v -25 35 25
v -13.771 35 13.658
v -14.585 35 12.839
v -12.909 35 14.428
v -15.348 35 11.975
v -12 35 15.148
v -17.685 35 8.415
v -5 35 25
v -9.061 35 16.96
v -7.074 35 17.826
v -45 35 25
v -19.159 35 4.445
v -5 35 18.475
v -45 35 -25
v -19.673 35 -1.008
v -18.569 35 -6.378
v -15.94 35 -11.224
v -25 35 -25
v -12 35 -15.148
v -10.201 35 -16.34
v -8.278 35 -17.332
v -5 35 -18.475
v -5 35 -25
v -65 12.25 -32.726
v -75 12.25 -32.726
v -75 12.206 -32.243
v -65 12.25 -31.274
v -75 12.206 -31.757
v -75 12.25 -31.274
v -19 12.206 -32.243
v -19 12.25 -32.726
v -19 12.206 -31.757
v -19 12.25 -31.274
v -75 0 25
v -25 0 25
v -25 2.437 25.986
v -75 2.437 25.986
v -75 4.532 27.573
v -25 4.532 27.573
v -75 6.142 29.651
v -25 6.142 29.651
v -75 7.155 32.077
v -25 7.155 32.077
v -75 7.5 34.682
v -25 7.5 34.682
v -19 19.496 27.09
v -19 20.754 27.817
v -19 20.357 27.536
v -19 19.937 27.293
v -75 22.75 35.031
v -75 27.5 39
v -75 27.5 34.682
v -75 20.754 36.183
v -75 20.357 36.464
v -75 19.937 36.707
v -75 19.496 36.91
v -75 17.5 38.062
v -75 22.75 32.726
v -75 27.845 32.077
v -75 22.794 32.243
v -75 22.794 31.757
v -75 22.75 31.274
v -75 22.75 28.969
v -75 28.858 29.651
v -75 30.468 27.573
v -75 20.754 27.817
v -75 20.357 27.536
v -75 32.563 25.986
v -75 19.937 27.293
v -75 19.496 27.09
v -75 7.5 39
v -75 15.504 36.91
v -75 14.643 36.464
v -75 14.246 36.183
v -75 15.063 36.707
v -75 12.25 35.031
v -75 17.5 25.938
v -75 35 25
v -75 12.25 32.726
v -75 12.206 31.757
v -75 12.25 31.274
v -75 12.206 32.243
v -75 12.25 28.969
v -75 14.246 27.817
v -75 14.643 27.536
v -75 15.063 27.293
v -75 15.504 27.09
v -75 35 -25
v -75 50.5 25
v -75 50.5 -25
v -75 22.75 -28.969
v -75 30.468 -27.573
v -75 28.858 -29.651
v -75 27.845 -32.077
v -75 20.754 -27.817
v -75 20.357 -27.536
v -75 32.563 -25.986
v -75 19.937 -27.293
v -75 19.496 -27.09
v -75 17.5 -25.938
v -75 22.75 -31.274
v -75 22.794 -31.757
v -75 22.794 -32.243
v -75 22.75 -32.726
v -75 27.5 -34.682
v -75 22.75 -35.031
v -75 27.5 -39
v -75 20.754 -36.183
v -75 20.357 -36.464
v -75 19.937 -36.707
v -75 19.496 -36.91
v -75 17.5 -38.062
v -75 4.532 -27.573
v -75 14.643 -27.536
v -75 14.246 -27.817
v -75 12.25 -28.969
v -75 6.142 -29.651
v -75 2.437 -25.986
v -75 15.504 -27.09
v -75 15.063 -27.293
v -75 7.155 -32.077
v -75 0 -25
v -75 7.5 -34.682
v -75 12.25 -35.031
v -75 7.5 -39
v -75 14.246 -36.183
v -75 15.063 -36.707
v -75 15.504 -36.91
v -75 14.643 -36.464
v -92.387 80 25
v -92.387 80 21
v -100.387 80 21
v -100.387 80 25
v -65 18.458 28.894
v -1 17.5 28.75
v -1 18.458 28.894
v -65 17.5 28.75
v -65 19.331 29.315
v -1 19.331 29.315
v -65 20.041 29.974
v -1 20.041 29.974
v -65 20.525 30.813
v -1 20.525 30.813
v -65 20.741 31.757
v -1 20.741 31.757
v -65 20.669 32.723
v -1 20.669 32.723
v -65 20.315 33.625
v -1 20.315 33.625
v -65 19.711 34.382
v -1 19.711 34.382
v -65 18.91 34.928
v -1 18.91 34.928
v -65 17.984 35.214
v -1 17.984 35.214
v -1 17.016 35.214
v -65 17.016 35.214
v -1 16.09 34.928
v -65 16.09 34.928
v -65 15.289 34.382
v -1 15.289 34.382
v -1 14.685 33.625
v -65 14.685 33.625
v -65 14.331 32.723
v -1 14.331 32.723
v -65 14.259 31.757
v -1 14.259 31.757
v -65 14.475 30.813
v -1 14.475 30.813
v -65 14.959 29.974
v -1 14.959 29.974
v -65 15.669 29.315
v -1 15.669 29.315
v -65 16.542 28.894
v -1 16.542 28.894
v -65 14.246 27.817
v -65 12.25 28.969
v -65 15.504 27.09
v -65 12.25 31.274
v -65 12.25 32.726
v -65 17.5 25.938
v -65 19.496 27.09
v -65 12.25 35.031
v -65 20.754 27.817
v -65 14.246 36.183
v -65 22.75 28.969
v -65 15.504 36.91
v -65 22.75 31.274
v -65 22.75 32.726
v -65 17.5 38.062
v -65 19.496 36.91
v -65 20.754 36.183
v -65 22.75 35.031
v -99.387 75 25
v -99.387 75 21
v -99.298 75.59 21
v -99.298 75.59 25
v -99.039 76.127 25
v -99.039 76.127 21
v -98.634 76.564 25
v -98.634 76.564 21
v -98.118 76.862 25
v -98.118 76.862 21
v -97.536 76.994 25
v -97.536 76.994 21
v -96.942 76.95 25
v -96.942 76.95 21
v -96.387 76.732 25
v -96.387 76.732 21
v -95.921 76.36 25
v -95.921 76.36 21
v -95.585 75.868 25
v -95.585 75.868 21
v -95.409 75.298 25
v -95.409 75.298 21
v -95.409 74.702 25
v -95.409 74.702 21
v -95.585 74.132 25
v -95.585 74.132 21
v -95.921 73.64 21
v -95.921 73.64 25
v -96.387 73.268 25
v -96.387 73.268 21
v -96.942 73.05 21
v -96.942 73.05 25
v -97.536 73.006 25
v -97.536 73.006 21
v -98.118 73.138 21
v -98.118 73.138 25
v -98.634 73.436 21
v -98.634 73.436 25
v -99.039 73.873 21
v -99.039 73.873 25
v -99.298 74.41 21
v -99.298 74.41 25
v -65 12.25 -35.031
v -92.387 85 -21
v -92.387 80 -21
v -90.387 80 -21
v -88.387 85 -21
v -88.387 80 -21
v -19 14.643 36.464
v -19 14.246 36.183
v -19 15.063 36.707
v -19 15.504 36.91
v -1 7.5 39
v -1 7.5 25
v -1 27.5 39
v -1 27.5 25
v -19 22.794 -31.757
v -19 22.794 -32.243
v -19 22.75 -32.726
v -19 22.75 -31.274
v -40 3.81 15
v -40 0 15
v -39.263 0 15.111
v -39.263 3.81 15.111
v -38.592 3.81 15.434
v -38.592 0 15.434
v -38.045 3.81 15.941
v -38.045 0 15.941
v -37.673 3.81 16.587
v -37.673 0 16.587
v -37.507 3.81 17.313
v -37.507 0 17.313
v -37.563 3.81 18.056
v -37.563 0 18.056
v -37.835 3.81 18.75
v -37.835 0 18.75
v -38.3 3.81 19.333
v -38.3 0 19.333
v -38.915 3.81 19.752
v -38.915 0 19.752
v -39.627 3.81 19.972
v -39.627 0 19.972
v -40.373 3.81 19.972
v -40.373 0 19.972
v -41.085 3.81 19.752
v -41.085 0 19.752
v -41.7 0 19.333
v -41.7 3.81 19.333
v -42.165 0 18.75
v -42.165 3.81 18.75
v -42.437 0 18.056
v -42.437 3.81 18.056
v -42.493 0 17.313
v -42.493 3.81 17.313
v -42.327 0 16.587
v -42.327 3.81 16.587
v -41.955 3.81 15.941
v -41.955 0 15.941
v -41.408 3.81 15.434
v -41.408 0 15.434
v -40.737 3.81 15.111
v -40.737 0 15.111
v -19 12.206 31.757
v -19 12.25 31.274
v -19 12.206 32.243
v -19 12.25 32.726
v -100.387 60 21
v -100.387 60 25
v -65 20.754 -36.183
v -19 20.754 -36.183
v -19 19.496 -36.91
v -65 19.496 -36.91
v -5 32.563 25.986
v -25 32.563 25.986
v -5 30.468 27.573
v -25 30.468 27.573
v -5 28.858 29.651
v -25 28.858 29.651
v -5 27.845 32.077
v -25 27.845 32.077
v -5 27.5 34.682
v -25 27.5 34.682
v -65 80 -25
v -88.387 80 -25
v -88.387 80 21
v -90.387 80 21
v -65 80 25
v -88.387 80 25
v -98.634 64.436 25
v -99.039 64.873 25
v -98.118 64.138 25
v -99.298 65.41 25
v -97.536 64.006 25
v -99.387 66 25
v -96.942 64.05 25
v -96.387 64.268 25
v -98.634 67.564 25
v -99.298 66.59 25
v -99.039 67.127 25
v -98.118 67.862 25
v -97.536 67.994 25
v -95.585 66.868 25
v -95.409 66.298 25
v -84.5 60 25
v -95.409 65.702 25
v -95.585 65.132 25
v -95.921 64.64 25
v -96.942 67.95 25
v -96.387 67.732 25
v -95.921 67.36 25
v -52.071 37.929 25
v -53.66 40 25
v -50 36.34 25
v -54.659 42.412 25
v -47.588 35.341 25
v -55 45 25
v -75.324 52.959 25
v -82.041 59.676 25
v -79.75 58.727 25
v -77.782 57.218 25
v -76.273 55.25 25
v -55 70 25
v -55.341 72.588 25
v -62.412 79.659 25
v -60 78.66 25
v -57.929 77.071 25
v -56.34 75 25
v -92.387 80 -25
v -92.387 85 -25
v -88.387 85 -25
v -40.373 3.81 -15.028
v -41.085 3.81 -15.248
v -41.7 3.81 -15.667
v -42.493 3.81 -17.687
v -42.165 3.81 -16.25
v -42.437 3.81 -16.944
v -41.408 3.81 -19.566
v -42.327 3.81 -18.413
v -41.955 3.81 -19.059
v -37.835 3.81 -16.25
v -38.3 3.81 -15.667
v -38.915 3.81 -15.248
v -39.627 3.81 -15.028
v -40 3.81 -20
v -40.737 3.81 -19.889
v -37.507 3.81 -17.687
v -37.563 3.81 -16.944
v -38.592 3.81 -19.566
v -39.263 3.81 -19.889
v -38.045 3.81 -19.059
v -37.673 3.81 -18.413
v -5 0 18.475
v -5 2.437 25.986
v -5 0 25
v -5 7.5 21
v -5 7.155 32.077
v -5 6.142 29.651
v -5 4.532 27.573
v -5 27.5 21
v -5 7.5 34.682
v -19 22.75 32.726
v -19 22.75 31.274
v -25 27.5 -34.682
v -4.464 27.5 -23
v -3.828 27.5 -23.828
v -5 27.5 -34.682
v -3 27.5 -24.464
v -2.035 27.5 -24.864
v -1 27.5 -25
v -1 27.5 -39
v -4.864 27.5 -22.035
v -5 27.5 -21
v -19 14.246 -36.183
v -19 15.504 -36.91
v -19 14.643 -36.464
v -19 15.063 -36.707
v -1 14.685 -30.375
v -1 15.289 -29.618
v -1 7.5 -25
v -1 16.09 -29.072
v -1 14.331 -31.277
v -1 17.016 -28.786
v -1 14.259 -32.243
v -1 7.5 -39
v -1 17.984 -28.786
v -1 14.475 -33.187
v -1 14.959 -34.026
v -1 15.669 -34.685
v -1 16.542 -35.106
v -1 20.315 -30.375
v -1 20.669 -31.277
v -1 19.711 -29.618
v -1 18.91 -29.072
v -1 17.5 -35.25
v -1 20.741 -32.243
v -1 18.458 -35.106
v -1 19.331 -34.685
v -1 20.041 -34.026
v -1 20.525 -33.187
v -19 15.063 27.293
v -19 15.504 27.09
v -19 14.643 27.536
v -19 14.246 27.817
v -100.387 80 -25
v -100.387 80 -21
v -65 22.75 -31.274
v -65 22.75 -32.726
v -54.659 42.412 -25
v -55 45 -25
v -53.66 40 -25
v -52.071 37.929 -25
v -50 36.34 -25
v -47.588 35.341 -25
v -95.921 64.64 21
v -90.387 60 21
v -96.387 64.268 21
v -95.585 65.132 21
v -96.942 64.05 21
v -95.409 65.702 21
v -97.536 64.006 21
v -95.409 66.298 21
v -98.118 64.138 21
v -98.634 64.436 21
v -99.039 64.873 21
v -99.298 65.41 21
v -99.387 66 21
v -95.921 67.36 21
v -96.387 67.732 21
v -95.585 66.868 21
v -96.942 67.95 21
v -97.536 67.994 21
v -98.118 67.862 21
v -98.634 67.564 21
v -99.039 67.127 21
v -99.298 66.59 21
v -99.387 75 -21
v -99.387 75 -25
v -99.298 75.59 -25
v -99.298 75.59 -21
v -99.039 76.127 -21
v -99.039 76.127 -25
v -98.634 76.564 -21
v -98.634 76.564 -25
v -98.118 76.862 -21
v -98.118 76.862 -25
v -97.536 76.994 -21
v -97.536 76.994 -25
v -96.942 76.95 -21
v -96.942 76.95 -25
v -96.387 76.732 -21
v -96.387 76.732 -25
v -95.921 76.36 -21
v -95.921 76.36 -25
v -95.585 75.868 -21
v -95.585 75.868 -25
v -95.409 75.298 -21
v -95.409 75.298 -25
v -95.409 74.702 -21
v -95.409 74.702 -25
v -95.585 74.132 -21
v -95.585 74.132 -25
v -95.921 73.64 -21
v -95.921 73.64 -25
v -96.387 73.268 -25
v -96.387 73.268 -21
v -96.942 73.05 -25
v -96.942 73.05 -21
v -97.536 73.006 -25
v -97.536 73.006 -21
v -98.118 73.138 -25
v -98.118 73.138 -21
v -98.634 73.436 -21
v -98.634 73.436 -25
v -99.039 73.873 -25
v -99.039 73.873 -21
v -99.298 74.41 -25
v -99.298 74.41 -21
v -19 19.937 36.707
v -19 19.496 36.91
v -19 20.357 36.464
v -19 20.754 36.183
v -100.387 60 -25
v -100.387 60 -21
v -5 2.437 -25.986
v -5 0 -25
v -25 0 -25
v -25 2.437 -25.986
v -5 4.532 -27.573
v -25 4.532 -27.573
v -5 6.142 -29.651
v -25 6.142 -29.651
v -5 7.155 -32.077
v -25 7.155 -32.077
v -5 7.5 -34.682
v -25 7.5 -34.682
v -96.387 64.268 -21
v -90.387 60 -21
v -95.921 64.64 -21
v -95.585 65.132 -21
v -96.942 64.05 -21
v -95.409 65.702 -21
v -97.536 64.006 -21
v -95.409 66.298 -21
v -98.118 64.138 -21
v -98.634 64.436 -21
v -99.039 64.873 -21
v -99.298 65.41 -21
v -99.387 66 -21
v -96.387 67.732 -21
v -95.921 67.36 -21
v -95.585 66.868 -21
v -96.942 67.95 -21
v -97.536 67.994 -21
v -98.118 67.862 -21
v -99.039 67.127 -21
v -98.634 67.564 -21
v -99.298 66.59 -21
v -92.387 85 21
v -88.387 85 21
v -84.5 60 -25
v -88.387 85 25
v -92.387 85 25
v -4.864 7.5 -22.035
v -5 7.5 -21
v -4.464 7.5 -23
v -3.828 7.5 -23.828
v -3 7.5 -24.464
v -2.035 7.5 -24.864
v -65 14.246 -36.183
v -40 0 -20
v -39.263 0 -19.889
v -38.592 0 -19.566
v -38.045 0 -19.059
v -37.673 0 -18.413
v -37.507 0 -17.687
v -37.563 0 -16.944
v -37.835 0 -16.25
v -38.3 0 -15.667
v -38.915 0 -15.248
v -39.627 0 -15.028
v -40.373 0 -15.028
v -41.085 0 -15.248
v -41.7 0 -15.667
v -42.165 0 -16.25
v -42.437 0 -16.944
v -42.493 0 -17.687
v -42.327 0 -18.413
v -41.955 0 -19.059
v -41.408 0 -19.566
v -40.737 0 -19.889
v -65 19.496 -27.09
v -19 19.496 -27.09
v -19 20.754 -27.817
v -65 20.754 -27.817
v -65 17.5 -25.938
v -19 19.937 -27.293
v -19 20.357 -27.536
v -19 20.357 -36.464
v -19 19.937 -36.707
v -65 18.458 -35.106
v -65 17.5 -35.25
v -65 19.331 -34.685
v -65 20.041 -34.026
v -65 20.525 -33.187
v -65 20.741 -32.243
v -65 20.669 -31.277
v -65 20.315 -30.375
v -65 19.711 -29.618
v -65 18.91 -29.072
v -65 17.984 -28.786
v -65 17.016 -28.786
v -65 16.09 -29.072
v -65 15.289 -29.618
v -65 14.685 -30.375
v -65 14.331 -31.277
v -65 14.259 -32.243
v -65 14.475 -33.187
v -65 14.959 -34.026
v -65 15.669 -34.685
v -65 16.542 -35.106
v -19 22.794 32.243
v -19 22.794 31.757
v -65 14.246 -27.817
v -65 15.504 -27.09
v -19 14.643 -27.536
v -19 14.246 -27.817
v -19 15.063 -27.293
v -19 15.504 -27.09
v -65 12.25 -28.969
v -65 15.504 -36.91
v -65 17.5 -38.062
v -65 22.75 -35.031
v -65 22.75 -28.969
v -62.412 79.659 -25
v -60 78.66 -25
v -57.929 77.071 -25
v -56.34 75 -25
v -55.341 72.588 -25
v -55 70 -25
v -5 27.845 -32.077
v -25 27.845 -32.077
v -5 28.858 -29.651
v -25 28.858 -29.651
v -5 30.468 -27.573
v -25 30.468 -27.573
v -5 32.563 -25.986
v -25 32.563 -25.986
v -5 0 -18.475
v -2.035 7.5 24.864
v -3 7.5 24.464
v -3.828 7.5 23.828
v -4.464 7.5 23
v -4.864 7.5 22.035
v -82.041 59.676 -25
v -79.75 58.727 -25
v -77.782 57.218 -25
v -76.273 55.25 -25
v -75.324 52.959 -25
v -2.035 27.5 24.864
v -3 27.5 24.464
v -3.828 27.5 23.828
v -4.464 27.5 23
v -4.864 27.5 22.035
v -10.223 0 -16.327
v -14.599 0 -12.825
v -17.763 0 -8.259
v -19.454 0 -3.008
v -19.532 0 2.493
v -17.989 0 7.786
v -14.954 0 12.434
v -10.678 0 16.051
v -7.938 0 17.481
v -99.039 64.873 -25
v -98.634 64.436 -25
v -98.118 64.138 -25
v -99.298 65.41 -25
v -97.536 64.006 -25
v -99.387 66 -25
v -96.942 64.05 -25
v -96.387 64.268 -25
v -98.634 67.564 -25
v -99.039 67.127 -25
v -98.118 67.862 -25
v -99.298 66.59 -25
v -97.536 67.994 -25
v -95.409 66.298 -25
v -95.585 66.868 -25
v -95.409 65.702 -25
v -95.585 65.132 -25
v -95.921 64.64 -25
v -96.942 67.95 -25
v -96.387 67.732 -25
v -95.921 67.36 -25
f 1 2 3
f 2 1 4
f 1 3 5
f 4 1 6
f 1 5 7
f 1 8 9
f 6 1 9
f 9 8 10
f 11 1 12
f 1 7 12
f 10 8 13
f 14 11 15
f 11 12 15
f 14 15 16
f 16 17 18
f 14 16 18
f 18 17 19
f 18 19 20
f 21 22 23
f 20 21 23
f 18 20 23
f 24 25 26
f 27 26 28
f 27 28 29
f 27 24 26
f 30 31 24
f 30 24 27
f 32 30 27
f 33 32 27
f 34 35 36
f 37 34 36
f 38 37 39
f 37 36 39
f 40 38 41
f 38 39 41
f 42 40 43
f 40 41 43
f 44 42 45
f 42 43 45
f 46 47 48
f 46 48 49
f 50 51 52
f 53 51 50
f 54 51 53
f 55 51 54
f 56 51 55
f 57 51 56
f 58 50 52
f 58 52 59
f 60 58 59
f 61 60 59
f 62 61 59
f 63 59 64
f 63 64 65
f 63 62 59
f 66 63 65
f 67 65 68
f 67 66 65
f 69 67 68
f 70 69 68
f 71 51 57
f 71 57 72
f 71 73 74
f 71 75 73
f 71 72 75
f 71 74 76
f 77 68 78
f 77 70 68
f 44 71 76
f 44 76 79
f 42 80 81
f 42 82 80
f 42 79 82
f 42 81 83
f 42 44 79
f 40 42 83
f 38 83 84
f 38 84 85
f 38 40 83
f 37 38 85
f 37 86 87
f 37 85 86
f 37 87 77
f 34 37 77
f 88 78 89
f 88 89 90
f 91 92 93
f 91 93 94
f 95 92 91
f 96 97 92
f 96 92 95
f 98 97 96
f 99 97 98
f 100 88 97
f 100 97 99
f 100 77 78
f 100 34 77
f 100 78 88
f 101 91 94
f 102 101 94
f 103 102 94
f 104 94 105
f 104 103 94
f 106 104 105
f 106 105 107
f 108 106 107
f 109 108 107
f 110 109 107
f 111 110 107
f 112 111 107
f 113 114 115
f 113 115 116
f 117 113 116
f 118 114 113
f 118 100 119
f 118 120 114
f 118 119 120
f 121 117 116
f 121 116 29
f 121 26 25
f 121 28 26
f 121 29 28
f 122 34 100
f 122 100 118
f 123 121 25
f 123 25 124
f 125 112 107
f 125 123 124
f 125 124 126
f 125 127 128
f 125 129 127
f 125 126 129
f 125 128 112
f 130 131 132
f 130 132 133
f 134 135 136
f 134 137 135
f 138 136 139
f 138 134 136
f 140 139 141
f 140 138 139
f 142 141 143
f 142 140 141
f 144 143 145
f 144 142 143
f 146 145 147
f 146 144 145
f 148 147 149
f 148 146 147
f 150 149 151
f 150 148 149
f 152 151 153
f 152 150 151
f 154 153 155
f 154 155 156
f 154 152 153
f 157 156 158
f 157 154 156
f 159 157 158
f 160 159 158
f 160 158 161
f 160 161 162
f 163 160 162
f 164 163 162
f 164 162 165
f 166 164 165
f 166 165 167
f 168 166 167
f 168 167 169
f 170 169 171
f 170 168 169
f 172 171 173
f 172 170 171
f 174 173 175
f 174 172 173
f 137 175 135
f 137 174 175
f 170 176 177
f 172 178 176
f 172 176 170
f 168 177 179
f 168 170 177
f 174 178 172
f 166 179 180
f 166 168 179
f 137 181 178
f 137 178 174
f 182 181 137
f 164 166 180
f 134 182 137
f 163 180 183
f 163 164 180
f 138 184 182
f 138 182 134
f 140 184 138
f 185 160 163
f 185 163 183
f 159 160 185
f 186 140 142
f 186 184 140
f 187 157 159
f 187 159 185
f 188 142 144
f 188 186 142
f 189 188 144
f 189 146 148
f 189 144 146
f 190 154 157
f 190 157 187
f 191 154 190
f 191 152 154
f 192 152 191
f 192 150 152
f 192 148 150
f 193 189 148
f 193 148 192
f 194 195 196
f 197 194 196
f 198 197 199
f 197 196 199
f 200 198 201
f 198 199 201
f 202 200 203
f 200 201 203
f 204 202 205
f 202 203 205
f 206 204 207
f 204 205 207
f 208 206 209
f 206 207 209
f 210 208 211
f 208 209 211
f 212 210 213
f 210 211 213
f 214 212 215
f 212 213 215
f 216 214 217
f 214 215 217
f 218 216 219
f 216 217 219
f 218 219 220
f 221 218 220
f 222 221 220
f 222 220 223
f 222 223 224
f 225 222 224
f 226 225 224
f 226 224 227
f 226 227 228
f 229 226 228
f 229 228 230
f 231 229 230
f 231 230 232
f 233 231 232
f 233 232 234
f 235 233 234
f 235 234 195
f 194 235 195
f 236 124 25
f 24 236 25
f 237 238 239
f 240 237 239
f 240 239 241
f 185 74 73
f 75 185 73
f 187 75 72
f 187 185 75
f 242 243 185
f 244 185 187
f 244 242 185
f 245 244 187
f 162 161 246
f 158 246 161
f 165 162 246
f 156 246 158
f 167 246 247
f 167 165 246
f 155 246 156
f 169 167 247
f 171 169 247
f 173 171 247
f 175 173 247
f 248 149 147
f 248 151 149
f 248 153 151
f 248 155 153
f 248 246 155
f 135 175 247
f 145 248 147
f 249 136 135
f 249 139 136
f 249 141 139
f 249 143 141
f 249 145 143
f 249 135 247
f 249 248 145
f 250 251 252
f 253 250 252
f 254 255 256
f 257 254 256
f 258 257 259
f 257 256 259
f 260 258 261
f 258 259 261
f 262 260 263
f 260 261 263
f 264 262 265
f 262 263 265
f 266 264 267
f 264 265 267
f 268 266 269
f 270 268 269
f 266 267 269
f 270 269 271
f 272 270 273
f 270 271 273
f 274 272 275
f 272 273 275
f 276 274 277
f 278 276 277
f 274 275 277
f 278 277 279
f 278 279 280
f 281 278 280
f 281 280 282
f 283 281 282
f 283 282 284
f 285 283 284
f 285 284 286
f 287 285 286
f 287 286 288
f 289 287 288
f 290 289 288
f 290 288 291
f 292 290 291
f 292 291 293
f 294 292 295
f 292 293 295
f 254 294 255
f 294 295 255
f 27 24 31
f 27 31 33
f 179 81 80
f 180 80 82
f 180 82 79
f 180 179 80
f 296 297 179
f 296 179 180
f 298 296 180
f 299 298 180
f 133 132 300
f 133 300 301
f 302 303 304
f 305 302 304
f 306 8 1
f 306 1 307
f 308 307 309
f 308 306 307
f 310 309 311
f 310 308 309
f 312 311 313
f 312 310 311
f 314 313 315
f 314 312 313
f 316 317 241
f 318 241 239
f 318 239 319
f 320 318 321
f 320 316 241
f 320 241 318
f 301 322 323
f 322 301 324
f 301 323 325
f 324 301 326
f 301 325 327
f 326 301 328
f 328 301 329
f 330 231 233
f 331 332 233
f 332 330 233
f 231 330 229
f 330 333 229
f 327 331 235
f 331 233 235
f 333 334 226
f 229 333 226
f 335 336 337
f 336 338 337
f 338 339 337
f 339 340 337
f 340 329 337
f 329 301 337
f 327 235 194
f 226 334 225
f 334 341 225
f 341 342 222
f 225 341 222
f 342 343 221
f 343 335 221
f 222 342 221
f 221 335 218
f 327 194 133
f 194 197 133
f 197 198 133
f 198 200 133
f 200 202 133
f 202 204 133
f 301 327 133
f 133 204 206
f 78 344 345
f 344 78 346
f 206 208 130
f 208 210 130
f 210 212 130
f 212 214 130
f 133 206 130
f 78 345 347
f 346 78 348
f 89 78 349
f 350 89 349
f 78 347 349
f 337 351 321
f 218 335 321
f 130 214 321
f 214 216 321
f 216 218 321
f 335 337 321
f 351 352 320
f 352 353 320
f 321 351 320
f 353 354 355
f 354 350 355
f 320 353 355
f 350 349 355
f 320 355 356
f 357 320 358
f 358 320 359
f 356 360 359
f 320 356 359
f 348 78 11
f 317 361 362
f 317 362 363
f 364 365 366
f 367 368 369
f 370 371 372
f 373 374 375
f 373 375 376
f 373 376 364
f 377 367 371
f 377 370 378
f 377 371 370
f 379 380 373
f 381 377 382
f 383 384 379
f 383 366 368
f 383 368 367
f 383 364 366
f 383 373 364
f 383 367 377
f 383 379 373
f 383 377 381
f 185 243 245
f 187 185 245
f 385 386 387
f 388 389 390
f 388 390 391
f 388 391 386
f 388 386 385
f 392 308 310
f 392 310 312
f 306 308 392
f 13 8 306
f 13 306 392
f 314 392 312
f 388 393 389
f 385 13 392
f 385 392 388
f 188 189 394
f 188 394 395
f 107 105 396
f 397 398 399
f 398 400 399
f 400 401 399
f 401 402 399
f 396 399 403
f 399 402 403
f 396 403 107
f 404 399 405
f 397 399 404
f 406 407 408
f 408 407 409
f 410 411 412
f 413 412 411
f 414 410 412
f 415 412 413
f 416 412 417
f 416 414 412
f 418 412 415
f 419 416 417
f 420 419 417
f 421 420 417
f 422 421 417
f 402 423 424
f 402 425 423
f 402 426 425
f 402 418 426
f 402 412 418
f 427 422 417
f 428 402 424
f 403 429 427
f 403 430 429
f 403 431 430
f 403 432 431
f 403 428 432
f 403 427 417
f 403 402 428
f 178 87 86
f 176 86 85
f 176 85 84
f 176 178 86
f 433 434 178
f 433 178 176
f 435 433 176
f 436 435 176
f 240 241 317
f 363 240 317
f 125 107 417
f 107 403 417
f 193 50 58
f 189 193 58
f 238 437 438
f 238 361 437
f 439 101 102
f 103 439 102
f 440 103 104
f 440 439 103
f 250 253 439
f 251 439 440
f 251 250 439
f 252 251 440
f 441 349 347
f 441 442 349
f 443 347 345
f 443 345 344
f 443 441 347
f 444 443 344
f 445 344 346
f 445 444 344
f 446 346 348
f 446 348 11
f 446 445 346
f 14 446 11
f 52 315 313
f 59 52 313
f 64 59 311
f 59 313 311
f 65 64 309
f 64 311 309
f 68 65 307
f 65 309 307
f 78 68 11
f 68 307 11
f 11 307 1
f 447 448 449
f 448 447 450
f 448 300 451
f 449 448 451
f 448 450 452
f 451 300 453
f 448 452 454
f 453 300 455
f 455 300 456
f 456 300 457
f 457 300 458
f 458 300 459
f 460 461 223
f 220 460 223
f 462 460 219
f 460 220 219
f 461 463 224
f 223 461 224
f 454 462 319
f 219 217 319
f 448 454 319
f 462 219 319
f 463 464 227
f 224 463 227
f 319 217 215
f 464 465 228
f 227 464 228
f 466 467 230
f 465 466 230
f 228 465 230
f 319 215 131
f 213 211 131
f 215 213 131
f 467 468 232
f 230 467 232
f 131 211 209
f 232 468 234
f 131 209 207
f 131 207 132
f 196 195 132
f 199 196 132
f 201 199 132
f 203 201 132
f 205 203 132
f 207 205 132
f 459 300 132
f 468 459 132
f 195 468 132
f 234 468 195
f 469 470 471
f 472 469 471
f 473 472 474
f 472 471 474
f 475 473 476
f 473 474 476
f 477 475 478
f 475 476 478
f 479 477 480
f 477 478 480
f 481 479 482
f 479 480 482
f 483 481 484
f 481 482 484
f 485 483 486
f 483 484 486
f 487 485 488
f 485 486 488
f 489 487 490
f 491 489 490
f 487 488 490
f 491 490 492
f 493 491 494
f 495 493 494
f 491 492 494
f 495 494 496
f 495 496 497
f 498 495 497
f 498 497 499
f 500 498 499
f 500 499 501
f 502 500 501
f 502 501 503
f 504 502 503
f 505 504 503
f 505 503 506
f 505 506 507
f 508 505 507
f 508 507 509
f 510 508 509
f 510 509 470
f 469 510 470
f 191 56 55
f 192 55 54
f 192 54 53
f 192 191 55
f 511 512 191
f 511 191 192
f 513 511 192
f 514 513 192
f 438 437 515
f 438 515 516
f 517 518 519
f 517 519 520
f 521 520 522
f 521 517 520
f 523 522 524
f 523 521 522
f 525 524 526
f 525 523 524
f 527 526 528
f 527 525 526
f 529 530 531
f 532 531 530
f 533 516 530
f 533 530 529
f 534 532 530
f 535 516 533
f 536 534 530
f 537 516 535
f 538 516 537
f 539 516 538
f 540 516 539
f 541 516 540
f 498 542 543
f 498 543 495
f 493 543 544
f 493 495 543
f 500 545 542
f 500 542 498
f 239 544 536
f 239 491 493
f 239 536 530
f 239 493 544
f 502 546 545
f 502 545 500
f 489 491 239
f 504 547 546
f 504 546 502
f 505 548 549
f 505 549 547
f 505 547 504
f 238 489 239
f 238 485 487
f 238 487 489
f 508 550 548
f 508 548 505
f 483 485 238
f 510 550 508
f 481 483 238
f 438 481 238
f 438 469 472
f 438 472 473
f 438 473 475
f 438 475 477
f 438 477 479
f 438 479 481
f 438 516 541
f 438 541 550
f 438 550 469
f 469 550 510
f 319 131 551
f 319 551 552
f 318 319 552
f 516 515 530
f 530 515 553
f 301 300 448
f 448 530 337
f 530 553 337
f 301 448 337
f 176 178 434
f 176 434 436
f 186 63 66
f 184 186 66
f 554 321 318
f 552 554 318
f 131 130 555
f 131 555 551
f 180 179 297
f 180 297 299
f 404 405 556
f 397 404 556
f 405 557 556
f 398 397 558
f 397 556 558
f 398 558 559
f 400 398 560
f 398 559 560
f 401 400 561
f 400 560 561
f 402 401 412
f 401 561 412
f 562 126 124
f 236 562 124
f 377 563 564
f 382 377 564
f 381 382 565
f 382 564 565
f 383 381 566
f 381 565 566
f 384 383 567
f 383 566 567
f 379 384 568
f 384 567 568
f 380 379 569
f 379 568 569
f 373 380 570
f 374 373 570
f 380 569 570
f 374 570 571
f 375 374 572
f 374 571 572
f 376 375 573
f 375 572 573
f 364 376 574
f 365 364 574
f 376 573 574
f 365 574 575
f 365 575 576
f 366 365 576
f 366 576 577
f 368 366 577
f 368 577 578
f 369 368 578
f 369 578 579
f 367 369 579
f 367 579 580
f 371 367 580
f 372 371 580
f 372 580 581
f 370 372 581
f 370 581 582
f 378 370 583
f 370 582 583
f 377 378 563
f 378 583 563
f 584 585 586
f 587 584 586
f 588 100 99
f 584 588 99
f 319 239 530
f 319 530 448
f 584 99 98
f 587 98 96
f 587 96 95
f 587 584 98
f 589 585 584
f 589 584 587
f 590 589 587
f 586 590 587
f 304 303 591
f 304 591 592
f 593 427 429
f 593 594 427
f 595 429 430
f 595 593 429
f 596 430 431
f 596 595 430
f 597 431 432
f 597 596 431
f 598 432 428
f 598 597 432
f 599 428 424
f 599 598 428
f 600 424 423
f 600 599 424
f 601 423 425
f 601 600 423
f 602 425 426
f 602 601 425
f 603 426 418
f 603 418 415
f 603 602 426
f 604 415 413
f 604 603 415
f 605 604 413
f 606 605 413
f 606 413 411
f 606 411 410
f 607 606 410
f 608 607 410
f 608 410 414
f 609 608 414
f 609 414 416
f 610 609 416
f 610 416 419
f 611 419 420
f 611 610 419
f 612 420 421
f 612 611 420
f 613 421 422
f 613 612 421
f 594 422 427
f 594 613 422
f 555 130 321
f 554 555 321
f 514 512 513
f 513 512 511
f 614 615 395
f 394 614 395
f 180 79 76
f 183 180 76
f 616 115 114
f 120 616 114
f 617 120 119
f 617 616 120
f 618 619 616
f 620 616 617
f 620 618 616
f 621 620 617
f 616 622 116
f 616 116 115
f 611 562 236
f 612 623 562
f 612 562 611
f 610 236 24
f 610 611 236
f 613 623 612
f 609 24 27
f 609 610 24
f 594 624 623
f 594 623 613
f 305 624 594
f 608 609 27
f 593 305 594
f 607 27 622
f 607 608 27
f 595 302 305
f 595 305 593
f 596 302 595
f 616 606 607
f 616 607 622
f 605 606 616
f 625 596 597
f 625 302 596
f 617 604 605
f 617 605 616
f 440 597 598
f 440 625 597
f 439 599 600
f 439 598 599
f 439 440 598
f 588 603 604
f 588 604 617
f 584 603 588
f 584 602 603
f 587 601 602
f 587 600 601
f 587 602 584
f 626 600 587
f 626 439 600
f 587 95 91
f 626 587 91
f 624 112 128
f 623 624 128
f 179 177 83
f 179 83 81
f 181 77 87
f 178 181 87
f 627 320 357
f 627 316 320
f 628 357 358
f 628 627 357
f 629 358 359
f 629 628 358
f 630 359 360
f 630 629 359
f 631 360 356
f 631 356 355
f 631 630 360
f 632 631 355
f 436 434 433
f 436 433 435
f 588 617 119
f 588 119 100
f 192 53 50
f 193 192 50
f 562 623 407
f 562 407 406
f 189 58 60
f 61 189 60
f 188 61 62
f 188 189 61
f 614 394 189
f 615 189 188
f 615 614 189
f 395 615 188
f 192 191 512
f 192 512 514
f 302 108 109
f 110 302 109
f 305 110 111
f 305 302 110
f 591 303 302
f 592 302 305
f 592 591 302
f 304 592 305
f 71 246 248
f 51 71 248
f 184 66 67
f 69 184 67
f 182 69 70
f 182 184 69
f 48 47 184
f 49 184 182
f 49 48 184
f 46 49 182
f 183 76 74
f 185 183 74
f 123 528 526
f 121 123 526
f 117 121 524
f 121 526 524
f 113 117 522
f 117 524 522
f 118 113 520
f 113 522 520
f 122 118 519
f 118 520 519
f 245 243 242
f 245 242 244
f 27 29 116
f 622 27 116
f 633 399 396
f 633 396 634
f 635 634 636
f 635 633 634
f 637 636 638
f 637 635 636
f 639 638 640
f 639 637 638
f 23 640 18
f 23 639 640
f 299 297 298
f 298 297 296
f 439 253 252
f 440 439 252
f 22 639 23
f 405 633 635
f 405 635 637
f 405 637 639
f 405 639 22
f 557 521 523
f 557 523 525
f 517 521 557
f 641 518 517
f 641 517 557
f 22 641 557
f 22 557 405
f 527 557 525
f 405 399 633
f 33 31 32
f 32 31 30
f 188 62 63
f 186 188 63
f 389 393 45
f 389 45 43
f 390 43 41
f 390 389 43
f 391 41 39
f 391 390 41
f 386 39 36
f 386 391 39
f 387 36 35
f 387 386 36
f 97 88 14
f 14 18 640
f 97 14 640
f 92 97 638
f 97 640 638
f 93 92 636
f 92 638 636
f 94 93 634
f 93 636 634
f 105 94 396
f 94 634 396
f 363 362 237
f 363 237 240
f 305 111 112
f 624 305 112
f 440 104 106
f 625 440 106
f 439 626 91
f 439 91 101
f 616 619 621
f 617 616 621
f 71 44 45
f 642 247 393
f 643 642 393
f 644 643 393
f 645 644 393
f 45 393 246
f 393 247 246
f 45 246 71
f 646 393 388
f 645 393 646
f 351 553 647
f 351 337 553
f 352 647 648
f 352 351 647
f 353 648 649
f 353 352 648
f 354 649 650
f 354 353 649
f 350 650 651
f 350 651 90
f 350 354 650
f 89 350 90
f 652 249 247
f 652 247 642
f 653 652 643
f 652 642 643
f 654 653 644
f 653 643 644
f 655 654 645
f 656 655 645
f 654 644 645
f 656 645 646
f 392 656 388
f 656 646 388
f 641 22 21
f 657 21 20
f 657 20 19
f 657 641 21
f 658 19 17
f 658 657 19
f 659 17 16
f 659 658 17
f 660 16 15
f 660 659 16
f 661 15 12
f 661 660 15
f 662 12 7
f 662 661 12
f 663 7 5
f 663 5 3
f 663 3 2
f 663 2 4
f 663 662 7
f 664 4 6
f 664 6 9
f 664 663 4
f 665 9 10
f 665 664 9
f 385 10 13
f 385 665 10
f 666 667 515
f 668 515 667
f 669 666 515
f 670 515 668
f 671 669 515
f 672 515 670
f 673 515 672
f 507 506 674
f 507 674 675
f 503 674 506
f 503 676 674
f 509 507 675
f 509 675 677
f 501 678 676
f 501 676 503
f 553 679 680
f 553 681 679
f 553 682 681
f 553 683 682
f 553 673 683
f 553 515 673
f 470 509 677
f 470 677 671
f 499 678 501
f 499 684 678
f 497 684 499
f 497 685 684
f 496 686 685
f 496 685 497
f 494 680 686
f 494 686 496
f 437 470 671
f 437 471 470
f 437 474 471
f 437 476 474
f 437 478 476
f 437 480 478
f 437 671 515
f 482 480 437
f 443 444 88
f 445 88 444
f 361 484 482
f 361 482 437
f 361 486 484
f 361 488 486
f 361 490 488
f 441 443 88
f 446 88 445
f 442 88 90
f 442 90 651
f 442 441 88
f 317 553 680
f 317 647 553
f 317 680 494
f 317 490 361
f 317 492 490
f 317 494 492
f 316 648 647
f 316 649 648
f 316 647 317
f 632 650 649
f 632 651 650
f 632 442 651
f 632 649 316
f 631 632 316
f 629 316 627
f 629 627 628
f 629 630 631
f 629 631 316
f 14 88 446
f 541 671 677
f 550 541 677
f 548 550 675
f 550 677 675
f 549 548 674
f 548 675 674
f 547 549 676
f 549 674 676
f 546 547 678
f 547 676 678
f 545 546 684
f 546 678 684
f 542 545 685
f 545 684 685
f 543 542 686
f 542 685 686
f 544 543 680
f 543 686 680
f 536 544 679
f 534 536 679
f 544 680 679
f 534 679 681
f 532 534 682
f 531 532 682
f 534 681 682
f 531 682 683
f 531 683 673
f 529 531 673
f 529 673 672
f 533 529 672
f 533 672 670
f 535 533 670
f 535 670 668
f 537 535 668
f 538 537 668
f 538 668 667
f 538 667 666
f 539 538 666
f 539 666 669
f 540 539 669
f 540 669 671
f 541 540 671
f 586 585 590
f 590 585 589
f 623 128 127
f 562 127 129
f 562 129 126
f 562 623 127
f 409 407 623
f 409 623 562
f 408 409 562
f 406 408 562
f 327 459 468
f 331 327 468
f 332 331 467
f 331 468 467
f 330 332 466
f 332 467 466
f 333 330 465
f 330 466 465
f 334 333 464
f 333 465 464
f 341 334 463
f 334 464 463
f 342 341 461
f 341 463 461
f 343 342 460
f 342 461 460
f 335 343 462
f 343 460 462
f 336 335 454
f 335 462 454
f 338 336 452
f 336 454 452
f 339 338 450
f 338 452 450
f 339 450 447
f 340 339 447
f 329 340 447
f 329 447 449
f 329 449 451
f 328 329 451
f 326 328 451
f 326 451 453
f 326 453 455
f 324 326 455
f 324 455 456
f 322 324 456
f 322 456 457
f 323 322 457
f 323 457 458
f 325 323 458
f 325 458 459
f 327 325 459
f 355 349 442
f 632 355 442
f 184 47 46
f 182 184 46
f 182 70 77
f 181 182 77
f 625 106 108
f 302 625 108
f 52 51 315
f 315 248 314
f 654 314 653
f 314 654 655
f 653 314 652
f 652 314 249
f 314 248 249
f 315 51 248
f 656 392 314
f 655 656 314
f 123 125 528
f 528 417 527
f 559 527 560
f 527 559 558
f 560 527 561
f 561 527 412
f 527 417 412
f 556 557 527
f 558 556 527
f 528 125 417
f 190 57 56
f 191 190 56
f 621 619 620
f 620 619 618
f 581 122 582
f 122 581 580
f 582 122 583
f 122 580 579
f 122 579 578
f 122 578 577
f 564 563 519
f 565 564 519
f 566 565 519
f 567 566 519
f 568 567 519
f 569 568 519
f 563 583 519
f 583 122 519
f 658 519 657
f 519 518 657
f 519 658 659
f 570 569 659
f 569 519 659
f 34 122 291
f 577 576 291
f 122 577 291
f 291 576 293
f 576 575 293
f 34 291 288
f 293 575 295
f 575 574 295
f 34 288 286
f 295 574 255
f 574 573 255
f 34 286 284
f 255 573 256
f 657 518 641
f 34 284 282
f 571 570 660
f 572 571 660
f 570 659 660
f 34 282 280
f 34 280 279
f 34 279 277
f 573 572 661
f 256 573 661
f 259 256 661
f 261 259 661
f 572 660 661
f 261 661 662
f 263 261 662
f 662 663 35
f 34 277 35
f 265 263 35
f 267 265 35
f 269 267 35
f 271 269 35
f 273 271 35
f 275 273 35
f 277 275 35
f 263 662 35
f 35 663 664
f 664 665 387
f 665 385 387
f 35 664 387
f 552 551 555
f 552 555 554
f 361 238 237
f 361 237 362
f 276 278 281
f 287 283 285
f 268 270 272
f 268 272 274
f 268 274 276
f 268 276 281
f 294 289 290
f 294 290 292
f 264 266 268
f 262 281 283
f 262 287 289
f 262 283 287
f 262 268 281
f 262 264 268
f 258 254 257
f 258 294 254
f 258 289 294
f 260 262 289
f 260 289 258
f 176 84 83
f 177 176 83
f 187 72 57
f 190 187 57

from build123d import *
from build123d.topology import SkipClean

# Parameters (mm, degrees)
SKETCH1_W                = 50
SKETCH1_H                = 50
SKETCH1_RX               = 19.7
SKETCH1_RY               = 19.1
BOSS_EXTRUDE1_DEPTH      = 35
SKETCH2_W                = 30
SKETCH2_H                = 50
CUT_EXTRUDE1_DEPTH       = 35
SKETCH3_W                = 13
SKETCH3_H                = 50
BOSS_EXTRUDE2_DEPTH      = 20
SKETCH4_R                = 1.5
CUT_EXTRUDE2_DEPTH       = 64.639610377
SKETCH5_W                = 36.974567712
SKETCH5_H                = 20
CUT_EXTRUDE3_DEPTH       = 20
BOSS_EXTRUDE3_DEPTH      = 4
BOSS_EXTRUDE3_DEPTH_BACK = 20
SKETCH6_W                = 14
SKETCH6_H                = 20
SKETCH6_R                = 3.25
SKETCH7_R                = 5.3
SKETCH7_R_2              = 3
CUT_EXTRUDE4_DEPTH       = 6
SKETCH8_W                = 13
SKETCH8_H                = 13.025432288
CUT_EXTRUDE5_DEPTH       = 30
FILLET6_R                = 4
FILLET5_R                = 10
SKETCH9_R                = 5.3
BOSS_EXTRUDE4_DEPTH      = 50
SKETCH10_W               = 20
SKETCH10_H               = 50
BOSS_EXTRUDE5_DEPTH      = 45
FILLET7_R                = 10
SKETCH11_W               = 50
SKETCH11_H               = 20
BOSS_EXTRUDE6_DEPTH      = 85
FILLET8_R                = 9.5
SKETCH13_R               = 37.5
BOSS_EXTRUDE7_DEPTH      = 20
CUT_EXTRUDE6_DEPTH       = 85
FILLET9_R                = 10
FILLET10_R               = 10
SKETCH14_R               = 3.25
CUT_EXTRUDE7_DEPTH       = 85
SKETCH15_R               = 5.3
CUT_EXTRUDE8_DEPTH       = 7
SKETCH16_R               = 3.25
BOSS_EXTRUDE9_DEPTH      = 56
SKETCH16_3_R             = 3.25
CUT_EXTRUDE11_DEPTH      = 10
SKETCH17_W               = 75
SKETCH17_H               = 20
CUT_EXTRUDE12_DEPTH      = 69.613081
SKETCH19_W               = 50
SKETCH19_H               = 20
BOSS_EXTRUDE10_DEPTH     = 10
SKETCH20_W               = 42
SKETCH20_H               = 20
CUT_EXTRUDE14_DEPTH      = 10
CUT_EXTRUDE15_REACH      = 145.435
SKETCH21_R               = 2
SKETCH22_W               = 4
SKETCH22_H               = 4
BOSS_EXTRUDE11_DEPTH     = 5
SKETCH25_R               = 2.5
CUT_EXTRUDE16_DEPTH      = 3.81


# Some blends are built 0.0001 mm under size
with BuildPart() as part:
    # Sketch1 → Boss-Extrude1 (new body)
    with BuildSketch(Plane(origin=(0, 0, 0), x_dir=(1, 0, 0), z_dir=(0, 1, 0))):
        Rectangle(SKETCH1_W, SKETCH1_H)
        with Locations((0, 0)):
            Ellipse(SKETCH1_RX, SKETCH1_RY, mode=Mode.SUBTRACT)
    extrude(amount=BOSS_EXTRUDE1_DEPTH)

    # Sketch2 → Cut-Extrude1 (cut)
    with BuildSketch(Plane(origin=(0, 35, 0), x_dir=(1, 0, 0), z_dir=(0, 1, 0))):
        with Locations((10, 0)):
            Rectangle(SKETCH2_W, SKETCH2_H)
    extrude(amount=-CUT_EXTRUDE1_DEPTH, mode=Mode.SUBTRACT)

    # Sketch3 → Boss-Extrude2 (add)
    with BuildSketch(Plane(origin=(0, 35, 0), x_dir=(1, 0, 0), z_dir=(0, 1, 0))):
        with Locations((-18.5, 0)):
            Rectangle(SKETCH3_W, SKETCH3_H)
    extrude(amount=BOSS_EXTRUDE2_DEPTH)

    # Sketch4 → Cut-Extrude2 (cut, through all)
    with BuildSketch(Plane.ZY.offset(25)):
        with Locations((18.474567712, 50)):
            Circle(SKETCH4_R)
    extrude(amount=-CUT_EXTRUDE2_DEPTH, mode=Mode.SUBTRACT)

    # Sketch5 → Cut-Extrude3 (cut)
    with BuildSketch(Plane(origin=(-12, 55, -25), x_dir=(0, 0, 1), z_dir=(-1, 0, 0))):
        with Locations((18.487283856, -10)):
            Rectangle(SKETCH5_W, SKETCH5_H)
    extrude(amount=CUT_EXTRUDE3_DEPTH, mode=Mode.SUBTRACT)

    # Sketch6 → Boss-Extrude3 (add, two sides: drawn at the far end of the back side and taken through both)
    # profile 1 of 2: a face of its own
    with BuildSketch(Plane(origin=(-5, 0, 0), x_dir=(0, 0, -1), z_dir=(1, 0, 0)).offset(-BOSS_EXTRUDE3_DEPTH_BACK)):
        with Locations((-32, 17.5)):
            Rectangle(SKETCH6_W, SKETCH6_H)
        with Locations((-32, 17.5)):
            Circle(SKETCH6_R, mode=Mode.SUBTRACT)
    # profile 2 of 2: a face of its own
    with BuildSketch(Plane(origin=(-5, 0, 0), x_dir=(0, 0, -1), z_dir=(1, 0, 0)).offset(-BOSS_EXTRUDE3_DEPTH_BACK)):
        with Locations((32, 17.5)):
            Rectangle(SKETCH6_W, SKETCH6_H)
        with Locations((32, 17.5)):
            Circle(SKETCH6_R, mode=Mode.SUBTRACT)
    extrude(amount=BOSS_EXTRUDE3_DEPTH + BOSS_EXTRUDE3_DEPTH_BACK)

    # Sketch7 → Cut-Extrude4 (cut)
    with BuildSketch(Plane.ZY.offset(25)):
        with Locations((-32, 17.5)):
            Circle(SKETCH7_R)
        with Locations((32, 17.5)):
            Circle(SKETCH7_R)
        with Locations((18.474567712, 50)):
            Circle(SKETCH7_R_2)
    extrude(amount=-CUT_EXTRUDE4_DEPTH, mode=Mode.SUBTRACT)

    # Sketch8 → Cut-Extrude5 (cut)
    with BuildSketch(Plane(origin=(0, 35, 0), x_dir=(1, 0, 0), z_dir=(0, 1, 0))):
        with Locations((-18.5, -18.487283856)):
            Rectangle(SKETCH8_W, SKETCH8_H)
    extrude(amount=CUT_EXTRUDE5_DEPTH, mode=Mode.SUBTRACT)

    # Fillet6
    fillet6_edges = [part.edges().sort_by_distance(p)[0] for p in [
        (-5, 17.5, 25),
        (-5, 17.5, -25),
    ]]
    fillet(fillet6_edges, radius=FILLET6_R - 0.0001)  # a hair under: the kernel refuses the full size

    # Fillet5
    # the kernel refuses this fillet: 10 mm, written as the material it adds along each edge
    with BuildSketch(Plane(origin=(-5, 7.5, 25), x_dir=(0, -1, 0), z_dir=(-1, 0, 0))) as fillet5_piece_1:
        with BuildLine():
            CenterArc((10, 9.682458366), FILLET5_R, 180, 75.522487814)
            Line((0, 9.682458366), (0, 0))
            Line((0, 0), (7.5, 0))
        make_face()
    extrude(amount=20)
    with BuildSketch(Plane(origin=(-5, 27.5, 25), x_dir=(0, 0, 1), z_dir=(-1, 0, 0)), Plane(origin=(-5, 7.5, -25), x_dir=(0, 0, -1), z_dir=(-1, 0, 0))) as fillet5_piece_2:
        with BuildLine():
            CenterArc((9.682458366, 10), FILLET5_R, 194.477512186, 75.522487814)
            Line((0, 7.5), (0, 0))
            Line((0, 0), (9.682458366, 0))
        make_face()
    extrude(amount=20)
    with BuildSketch(Plane(origin=(-5, 27.5, -25), x_dir=(0, 0, -1), z_dir=(-1, 0, 0))) as fillet5_piece_3:
        with BuildLine():
            CenterArc((9.682458366, -10), FILLET5_R, 90, 75.522487814)
            Line((0, -7.5), (0, 0))
            Line((0, 0), (9.682458366, 0))
        make_face()
    extrude(amount=20)

    # Sketch9 → Boss-Extrude4 (add)
    with BuildSketch(Plane.ZY.offset(25)):
        with BuildLine():
            Line((39, 27.5), (34.682458366, 27.5))
            ThreePointArc((34.682458366, 27.5), (28.558734009, 29.59430585), (25, 35))
            Line((25, 35), (-25, 35))
            ThreePointArc((-25, 35), (-28.558734009, 29.59430585), (-34.682458366, 27.5))
            Line((-34.682458366, 27.5), (-39, 27.5))
            Line((-39, 27.5), (-39, 7.5))
            Line((-39, 7.5), (-34.682458366, 7.5))
            ThreePointArc((-34.682458366, 7.5), (-28.558734009, 5.40569415), (-25, 0))
            Line((-25, 0), (25, 0))
            ThreePointArc((25, 0), (28.558734009, 5.40569415), (34.682458366, 7.5))
            Line((34.682458366, 7.5), (39, 7.5))
            Line((39, 7.5), (39, 27.5))
        make_face()
        with Locations((32, 17.5)):
            Circle(SKETCH9_R, mode=Mode.SUBTRACT)
        with Locations((-32, 17.5)):
            Circle(SKETCH9_R, mode=Mode.SUBTRACT)
    extrude(amount=BOSS_EXTRUDE4_DEPTH)

    # Sketch10 → Boss-Extrude5 (add)
    with SkipClean():  # the faces are left unmerged after this step: merging them gives an invalid solid
        with BuildSketch(Plane(origin=(0, 35, 0), x_dir=(1, 0, 0), z_dir=(0, 1, 0))):
            with Locations((-65, 0)):
                Rectangle(SKETCH10_W, SKETCH10_H)
        extrude(amount=BOSS_EXTRUDE5_DEPTH)

    # Fillet7
    fillet7_edges = [part.edges().sort_by_distance(p)[0] for p in [
        (-55, 35, 0),
    ]]
    fillet(fillet7_edges, radius=FILLET7_R)

    # Sketch11 → Boss-Extrude6 (add)
    with SkipClean():  # the faces are left unmerged after this step: merging them gives an invalid solid
        with BuildSketch(Plane.ZY.offset(75)):
            with Locations((0, 70)):
                Rectangle(SKETCH11_W, SKETCH11_H)
        extrude(amount=BOSS_EXTRUDE6_DEPTH)

    # Fillet8
    fillet8_edges = [part.edges().sort_by_distance(p)[0] for p in [
        (-75, 60, 0),
    ]]
    fillet(fillet8_edges, radius=FILLET8_R)

    # Sketch13 → Boss-Extrude7 (add)
    with SkipClean():  # the faces are left unmerged after this step: merging them gives an invalid solid
        with BuildSketch(Plane(origin=(0, 80, 0), x_dir=(1, 0, 0), z_dir=(0, 1, 0))):
            with Locations((-122.5, 0)):
                Circle(SKETCH13_R)
        extrude(amount=-BOSS_EXTRUDE7_DEPTH)

    # Sketch13<3> → Cut-Extrude6 (cut)
    with SkipClean():  # the faces are left unmerged after this step: merging them gives an invalid solid
        with BuildSketch(Plane(origin=(0, 80, 0), x_dir=(1, 0, 0), z_dir=(0, 1, 0))):
            with BuildLine():
                ThreePointArc((-150.450849719, -25), (-157.531463446, -13.380828406), (-160, -8.4e-08))
                Line((-160, -8.4e-08), (-160, -25))
                Line((-160, -25), (-150.450849719, -25))
            make_face()
            with BuildLine():
                Line((-150.450849719, 25), (-160, 25))
                Line((-160, 25), (-160, -8.4e-08))
                ThreePointArc((-160, -8.4e-08), (-157.531463476, 13.380828327), (-150.450849719, 25))
            make_face()
        extrude(amount=-CUT_EXTRUDE6_DEPTH, mode=Mode.SUBTRACT)

    # Fillet9
    fillet9_edges = [part.edges().sort_by_distance(p)[0] for p in [
        (-94.549150281, 70, 25),
        (-94.549150281, 70, -25),
    ]]
    fillet(fillet9_edges, radius=FILLET9_R)

    # Fillet10
    fillet10_edges = [part.edges().sort_by_distance(p)[0] for p in [
        (-55, 80, 0),
    ]]
    fillet(fillet10_edges, radius=FILLET10_R)

    # Sketch14 → Cut-Extrude7 (cut)
    with SkipClean():  # the faces are left unmerged after this step: merging them gives an invalid solid
        with BuildSketch(Plane(origin=(0, 80, 0), x_dir=(1, 0, 0), z_dir=(0, 1, 0))):
            with Locations(Location((-140.17766953, 17.67766953, 0), (0, 0, 270))):
                Circle(SKETCH14_R)
            with Locations(Location((-140.17766953, -17.67766953, 0), (0, 0, 270))):
                Circle(SKETCH14_R)
            with Locations(Location((-104.82233047, -17.67766953, 0), (0, 0, 270))):
                Circle(SKETCH14_R)
            with Locations(Location((-104.82233047, 17.67766953, 0), (0, 0, 270))):
                Circle(SKETCH14_R)
        extrude(amount=-CUT_EXTRUDE7_DEPTH, mode=Mode.SUBTRACT)

    # Sketch15 → Cut-Extrude8 (cut)
    with SkipClean():  # the faces are left unmerged after this step: merging them gives an invalid solid
        with BuildSketch(Plane(origin=(0, 80, 0), x_dir=(1, 0, 0), z_dir=(0, 1, 0))):
            with Locations(Location((-140.17766953, 17.67766953, 0), (0, 0, 270))):
                Circle(SKETCH15_R)
            with Locations(Location((-140.17766953, -17.67766953, 0), (0, 0, 270))):
                Circle(SKETCH15_R)
            with Locations(Location((-104.82233047, -17.67766953, 0), (0, 0, 270))):
                Circle(SKETCH15_R)
            with Locations(Location((-104.82233047, 17.67766953, 0), (0, 0, 270))):
                Circle(SKETCH15_R)
        extrude(amount=-CUT_EXTRUDE8_DEPTH, mode=Mode.SUBTRACT)

    # Sketch16 → Boss-Extrude9 (add)
    # profile 1 of 2: a face of its own
    with SkipClean():  # the faces are left unmerged after this step: merging them gives an invalid solid
        with BuildSketch(Plane.ZY.offset(75)):
            Polygon((-25.937822174, 17.5), (-28.968911087, 22.75), (-35.031088913, 22.75), (-38.062177826, 17.5), (-35.031088913, 12.25), (-28.968911087, 12.25), align=None)
            with Locations(Location((-32, 17.5, 0), (0, 0, 180))):
                Circle(SKETCH16_R, mode=Mode.SUBTRACT)
        # profile 2 of 2: a face of its own
        with BuildSketch(Plane.ZY.offset(75)):
            Polygon((25.937822174, 17.5), (28.968911087, 12.25), (35.031088913, 12.25), (38.062177826, 17.5), (35.031088913, 22.75), (28.968911087, 22.75), align=None)
            with Locations(Location((32, 17.5, 0), (0, 0, 180))):
                Circle(SKETCH16_R, mode=Mode.SUBTRACT)
        extrude(amount=-BOSS_EXTRUDE9_DEPTH)

    # Sketch16<3> → Cut-Extrude11 (cut)
    # profile 1 of 2: a face of its own
    with SkipClean():  # the faces are left unmerged after this step: merging them gives an invalid solid
        with BuildSketch(Plane.ZY.offset(75)):
            Polygon((-25.937822174, 17.5), (-28.968911087, 22.75), (-35.031088913, 22.75), (-38.062177826, 17.5), (-35.031088913, 12.25), (-28.968911087, 12.25), align=None)
            with Locations(Location((-32, 17.5, 0), (0, 0, 180))):
                Circle(SKETCH16_3_R, mode=Mode.SUBTRACT)
        # profile 2 of 2: a face of its own
        with BuildSketch(Plane.ZY.offset(75)):
            Polygon((25.937822174, 17.5), (28.968911087, 12.25), (35.031088913, 12.25), (38.062177826, 17.5), (35.031088913, 22.75), (28.968911087, 22.75), align=None)
            with Locations(Location((32, 17.5, 0), (0, 0, 180))):
                Circle(SKETCH16_3_R, mode=Mode.SUBTRACT)
        extrude(amount=-CUT_EXTRUDE11_DEPTH, mode=Mode.SUBTRACT)

    # Sketch17 → Cut-Extrude12 (cut)
    with SkipClean():  # the faces are left unmerged after this step: merging them gives an invalid solid
        with BuildSketch(Plane.ZY.offset(160)):
            with Locations((0, 70)):
                Rectangle(SKETCH17_W, SKETCH17_H)
        extrude(amount=-CUT_EXTRUDE12_DEPTH, mode=Mode.SUBTRACT)

    # Sketch19 → Boss-Extrude10 (add)
    with SkipClean():  # the faces are left unmerged after this step: merging them gives an invalid solid
        with BuildSketch(Plane.ZY.offset(90.386918553)):
            with Locations((0, 70)):
                Rectangle(SKETCH19_W, SKETCH19_H)
        extrude(amount=BOSS_EXTRUDE10_DEPTH)

    # Sketch20 → Cut-Extrude14 (cut)
    with SkipClean():  # the faces are left unmerged after this step: merging them gives an invalid solid
        with BuildSketch(Plane.ZY.offset(100.386918553)):
            with Locations((0, 70)):
                Rectangle(SKETCH20_W, SKETCH20_H)
        extrude(amount=-CUT_EXTRUDE14_DEPTH, mode=Mode.SUBTRACT)

    # Cut-Extrude15: up to this face of the body (flat: up to its plane)
    cut_extrude15_end = Plane(part.part.faces().sort_by_distance((-64.8934774, 56.533513417, 25))[0])
    # Sketch21 → Cut-Extrude15 (cut, up to the picked face)
    with BuildSketch(Plane(origin=(0, 0, -25), x_dir=(-1, 0, 0), z_dir=(0, 0, -1)), mode=Mode.PRIVATE) as cut_extrude15_sk1:
        with Locations((97.386918553, 75)):
            Circle(SKETCH21_R)
    cut_extrude15_tool1 = split(extrude(cut_extrude15_sk1.sketch, amount=-CUT_EXTRUDE15_REACH, mode=Mode.PRIVATE), bisect_by=cut_extrude15_end, keep=Keep.BOTH, mode=Mode.PRIVATE)
    # Sketch21 → Cut-Extrude15 (cut, up to the picked face)
    with BuildSketch(Plane(origin=(0, 0, -25), x_dir=(-1, 0, 0), z_dir=(0, 0, -1)), mode=Mode.PRIVATE) as cut_extrude15_sk2:
        with Locations((97.386918553, 66)):
            Circle(SKETCH21_R)
    cut_extrude15_tool2 = split(extrude(cut_extrude15_sk2.sketch, amount=-CUT_EXTRUDE15_REACH, mode=Mode.PRIVATE), bisect_by=cut_extrude15_end, keep=Keep.BOTH, mode=Mode.PRIVATE)
    add(cut_extrude15_tool1.solids().sort_by(Axis((-97.386919, 75, -25), (0, 0, 1)))[0], mode=Mode.SUBTRACT)
    add(cut_extrude15_tool2.solids().sort_by(Axis((-97.386919, 66, -25), (0, 0, 1)))[0], mode=Mode.SUBTRACT)

    # Sketch22 → Boss-Extrude11 (add)
    with SkipClean():  # the faces are left unmerged after this step: merging them gives an invalid solid
        with BuildSketch(Plane(origin=(0, 80, 0), x_dir=(1, 0, 0), z_dir=(0, 1, 0))):
            with Locations((-90.386918553, 23)):
                Rectangle(SKETCH22_W, SKETCH22_H)
            with Locations((-90.386918553, -23)):
                Rectangle(SKETCH22_W, SKETCH22_H)
        extrude(amount=BOSS_EXTRUDE11_DEPTH)

    # Sketch25 → Cut-Extrude16 (cut)
    with SkipClean():  # the faces are left unmerged after this step: merging them gives an invalid solid
        with BuildSketch(Plane.XZ):
            with Locations(Location((-40, 17.5, 0), (0, 0, 270))):
                Circle(SKETCH25_R)
            with Locations(Location((-40, -17.5, 0), (0, 0, 270))):
                Circle(SKETCH25_R)
        extrude(amount=-CUT_EXTRUDE16_DEPTH, mode=Mode.SUBTRACT)


solid = part.part
